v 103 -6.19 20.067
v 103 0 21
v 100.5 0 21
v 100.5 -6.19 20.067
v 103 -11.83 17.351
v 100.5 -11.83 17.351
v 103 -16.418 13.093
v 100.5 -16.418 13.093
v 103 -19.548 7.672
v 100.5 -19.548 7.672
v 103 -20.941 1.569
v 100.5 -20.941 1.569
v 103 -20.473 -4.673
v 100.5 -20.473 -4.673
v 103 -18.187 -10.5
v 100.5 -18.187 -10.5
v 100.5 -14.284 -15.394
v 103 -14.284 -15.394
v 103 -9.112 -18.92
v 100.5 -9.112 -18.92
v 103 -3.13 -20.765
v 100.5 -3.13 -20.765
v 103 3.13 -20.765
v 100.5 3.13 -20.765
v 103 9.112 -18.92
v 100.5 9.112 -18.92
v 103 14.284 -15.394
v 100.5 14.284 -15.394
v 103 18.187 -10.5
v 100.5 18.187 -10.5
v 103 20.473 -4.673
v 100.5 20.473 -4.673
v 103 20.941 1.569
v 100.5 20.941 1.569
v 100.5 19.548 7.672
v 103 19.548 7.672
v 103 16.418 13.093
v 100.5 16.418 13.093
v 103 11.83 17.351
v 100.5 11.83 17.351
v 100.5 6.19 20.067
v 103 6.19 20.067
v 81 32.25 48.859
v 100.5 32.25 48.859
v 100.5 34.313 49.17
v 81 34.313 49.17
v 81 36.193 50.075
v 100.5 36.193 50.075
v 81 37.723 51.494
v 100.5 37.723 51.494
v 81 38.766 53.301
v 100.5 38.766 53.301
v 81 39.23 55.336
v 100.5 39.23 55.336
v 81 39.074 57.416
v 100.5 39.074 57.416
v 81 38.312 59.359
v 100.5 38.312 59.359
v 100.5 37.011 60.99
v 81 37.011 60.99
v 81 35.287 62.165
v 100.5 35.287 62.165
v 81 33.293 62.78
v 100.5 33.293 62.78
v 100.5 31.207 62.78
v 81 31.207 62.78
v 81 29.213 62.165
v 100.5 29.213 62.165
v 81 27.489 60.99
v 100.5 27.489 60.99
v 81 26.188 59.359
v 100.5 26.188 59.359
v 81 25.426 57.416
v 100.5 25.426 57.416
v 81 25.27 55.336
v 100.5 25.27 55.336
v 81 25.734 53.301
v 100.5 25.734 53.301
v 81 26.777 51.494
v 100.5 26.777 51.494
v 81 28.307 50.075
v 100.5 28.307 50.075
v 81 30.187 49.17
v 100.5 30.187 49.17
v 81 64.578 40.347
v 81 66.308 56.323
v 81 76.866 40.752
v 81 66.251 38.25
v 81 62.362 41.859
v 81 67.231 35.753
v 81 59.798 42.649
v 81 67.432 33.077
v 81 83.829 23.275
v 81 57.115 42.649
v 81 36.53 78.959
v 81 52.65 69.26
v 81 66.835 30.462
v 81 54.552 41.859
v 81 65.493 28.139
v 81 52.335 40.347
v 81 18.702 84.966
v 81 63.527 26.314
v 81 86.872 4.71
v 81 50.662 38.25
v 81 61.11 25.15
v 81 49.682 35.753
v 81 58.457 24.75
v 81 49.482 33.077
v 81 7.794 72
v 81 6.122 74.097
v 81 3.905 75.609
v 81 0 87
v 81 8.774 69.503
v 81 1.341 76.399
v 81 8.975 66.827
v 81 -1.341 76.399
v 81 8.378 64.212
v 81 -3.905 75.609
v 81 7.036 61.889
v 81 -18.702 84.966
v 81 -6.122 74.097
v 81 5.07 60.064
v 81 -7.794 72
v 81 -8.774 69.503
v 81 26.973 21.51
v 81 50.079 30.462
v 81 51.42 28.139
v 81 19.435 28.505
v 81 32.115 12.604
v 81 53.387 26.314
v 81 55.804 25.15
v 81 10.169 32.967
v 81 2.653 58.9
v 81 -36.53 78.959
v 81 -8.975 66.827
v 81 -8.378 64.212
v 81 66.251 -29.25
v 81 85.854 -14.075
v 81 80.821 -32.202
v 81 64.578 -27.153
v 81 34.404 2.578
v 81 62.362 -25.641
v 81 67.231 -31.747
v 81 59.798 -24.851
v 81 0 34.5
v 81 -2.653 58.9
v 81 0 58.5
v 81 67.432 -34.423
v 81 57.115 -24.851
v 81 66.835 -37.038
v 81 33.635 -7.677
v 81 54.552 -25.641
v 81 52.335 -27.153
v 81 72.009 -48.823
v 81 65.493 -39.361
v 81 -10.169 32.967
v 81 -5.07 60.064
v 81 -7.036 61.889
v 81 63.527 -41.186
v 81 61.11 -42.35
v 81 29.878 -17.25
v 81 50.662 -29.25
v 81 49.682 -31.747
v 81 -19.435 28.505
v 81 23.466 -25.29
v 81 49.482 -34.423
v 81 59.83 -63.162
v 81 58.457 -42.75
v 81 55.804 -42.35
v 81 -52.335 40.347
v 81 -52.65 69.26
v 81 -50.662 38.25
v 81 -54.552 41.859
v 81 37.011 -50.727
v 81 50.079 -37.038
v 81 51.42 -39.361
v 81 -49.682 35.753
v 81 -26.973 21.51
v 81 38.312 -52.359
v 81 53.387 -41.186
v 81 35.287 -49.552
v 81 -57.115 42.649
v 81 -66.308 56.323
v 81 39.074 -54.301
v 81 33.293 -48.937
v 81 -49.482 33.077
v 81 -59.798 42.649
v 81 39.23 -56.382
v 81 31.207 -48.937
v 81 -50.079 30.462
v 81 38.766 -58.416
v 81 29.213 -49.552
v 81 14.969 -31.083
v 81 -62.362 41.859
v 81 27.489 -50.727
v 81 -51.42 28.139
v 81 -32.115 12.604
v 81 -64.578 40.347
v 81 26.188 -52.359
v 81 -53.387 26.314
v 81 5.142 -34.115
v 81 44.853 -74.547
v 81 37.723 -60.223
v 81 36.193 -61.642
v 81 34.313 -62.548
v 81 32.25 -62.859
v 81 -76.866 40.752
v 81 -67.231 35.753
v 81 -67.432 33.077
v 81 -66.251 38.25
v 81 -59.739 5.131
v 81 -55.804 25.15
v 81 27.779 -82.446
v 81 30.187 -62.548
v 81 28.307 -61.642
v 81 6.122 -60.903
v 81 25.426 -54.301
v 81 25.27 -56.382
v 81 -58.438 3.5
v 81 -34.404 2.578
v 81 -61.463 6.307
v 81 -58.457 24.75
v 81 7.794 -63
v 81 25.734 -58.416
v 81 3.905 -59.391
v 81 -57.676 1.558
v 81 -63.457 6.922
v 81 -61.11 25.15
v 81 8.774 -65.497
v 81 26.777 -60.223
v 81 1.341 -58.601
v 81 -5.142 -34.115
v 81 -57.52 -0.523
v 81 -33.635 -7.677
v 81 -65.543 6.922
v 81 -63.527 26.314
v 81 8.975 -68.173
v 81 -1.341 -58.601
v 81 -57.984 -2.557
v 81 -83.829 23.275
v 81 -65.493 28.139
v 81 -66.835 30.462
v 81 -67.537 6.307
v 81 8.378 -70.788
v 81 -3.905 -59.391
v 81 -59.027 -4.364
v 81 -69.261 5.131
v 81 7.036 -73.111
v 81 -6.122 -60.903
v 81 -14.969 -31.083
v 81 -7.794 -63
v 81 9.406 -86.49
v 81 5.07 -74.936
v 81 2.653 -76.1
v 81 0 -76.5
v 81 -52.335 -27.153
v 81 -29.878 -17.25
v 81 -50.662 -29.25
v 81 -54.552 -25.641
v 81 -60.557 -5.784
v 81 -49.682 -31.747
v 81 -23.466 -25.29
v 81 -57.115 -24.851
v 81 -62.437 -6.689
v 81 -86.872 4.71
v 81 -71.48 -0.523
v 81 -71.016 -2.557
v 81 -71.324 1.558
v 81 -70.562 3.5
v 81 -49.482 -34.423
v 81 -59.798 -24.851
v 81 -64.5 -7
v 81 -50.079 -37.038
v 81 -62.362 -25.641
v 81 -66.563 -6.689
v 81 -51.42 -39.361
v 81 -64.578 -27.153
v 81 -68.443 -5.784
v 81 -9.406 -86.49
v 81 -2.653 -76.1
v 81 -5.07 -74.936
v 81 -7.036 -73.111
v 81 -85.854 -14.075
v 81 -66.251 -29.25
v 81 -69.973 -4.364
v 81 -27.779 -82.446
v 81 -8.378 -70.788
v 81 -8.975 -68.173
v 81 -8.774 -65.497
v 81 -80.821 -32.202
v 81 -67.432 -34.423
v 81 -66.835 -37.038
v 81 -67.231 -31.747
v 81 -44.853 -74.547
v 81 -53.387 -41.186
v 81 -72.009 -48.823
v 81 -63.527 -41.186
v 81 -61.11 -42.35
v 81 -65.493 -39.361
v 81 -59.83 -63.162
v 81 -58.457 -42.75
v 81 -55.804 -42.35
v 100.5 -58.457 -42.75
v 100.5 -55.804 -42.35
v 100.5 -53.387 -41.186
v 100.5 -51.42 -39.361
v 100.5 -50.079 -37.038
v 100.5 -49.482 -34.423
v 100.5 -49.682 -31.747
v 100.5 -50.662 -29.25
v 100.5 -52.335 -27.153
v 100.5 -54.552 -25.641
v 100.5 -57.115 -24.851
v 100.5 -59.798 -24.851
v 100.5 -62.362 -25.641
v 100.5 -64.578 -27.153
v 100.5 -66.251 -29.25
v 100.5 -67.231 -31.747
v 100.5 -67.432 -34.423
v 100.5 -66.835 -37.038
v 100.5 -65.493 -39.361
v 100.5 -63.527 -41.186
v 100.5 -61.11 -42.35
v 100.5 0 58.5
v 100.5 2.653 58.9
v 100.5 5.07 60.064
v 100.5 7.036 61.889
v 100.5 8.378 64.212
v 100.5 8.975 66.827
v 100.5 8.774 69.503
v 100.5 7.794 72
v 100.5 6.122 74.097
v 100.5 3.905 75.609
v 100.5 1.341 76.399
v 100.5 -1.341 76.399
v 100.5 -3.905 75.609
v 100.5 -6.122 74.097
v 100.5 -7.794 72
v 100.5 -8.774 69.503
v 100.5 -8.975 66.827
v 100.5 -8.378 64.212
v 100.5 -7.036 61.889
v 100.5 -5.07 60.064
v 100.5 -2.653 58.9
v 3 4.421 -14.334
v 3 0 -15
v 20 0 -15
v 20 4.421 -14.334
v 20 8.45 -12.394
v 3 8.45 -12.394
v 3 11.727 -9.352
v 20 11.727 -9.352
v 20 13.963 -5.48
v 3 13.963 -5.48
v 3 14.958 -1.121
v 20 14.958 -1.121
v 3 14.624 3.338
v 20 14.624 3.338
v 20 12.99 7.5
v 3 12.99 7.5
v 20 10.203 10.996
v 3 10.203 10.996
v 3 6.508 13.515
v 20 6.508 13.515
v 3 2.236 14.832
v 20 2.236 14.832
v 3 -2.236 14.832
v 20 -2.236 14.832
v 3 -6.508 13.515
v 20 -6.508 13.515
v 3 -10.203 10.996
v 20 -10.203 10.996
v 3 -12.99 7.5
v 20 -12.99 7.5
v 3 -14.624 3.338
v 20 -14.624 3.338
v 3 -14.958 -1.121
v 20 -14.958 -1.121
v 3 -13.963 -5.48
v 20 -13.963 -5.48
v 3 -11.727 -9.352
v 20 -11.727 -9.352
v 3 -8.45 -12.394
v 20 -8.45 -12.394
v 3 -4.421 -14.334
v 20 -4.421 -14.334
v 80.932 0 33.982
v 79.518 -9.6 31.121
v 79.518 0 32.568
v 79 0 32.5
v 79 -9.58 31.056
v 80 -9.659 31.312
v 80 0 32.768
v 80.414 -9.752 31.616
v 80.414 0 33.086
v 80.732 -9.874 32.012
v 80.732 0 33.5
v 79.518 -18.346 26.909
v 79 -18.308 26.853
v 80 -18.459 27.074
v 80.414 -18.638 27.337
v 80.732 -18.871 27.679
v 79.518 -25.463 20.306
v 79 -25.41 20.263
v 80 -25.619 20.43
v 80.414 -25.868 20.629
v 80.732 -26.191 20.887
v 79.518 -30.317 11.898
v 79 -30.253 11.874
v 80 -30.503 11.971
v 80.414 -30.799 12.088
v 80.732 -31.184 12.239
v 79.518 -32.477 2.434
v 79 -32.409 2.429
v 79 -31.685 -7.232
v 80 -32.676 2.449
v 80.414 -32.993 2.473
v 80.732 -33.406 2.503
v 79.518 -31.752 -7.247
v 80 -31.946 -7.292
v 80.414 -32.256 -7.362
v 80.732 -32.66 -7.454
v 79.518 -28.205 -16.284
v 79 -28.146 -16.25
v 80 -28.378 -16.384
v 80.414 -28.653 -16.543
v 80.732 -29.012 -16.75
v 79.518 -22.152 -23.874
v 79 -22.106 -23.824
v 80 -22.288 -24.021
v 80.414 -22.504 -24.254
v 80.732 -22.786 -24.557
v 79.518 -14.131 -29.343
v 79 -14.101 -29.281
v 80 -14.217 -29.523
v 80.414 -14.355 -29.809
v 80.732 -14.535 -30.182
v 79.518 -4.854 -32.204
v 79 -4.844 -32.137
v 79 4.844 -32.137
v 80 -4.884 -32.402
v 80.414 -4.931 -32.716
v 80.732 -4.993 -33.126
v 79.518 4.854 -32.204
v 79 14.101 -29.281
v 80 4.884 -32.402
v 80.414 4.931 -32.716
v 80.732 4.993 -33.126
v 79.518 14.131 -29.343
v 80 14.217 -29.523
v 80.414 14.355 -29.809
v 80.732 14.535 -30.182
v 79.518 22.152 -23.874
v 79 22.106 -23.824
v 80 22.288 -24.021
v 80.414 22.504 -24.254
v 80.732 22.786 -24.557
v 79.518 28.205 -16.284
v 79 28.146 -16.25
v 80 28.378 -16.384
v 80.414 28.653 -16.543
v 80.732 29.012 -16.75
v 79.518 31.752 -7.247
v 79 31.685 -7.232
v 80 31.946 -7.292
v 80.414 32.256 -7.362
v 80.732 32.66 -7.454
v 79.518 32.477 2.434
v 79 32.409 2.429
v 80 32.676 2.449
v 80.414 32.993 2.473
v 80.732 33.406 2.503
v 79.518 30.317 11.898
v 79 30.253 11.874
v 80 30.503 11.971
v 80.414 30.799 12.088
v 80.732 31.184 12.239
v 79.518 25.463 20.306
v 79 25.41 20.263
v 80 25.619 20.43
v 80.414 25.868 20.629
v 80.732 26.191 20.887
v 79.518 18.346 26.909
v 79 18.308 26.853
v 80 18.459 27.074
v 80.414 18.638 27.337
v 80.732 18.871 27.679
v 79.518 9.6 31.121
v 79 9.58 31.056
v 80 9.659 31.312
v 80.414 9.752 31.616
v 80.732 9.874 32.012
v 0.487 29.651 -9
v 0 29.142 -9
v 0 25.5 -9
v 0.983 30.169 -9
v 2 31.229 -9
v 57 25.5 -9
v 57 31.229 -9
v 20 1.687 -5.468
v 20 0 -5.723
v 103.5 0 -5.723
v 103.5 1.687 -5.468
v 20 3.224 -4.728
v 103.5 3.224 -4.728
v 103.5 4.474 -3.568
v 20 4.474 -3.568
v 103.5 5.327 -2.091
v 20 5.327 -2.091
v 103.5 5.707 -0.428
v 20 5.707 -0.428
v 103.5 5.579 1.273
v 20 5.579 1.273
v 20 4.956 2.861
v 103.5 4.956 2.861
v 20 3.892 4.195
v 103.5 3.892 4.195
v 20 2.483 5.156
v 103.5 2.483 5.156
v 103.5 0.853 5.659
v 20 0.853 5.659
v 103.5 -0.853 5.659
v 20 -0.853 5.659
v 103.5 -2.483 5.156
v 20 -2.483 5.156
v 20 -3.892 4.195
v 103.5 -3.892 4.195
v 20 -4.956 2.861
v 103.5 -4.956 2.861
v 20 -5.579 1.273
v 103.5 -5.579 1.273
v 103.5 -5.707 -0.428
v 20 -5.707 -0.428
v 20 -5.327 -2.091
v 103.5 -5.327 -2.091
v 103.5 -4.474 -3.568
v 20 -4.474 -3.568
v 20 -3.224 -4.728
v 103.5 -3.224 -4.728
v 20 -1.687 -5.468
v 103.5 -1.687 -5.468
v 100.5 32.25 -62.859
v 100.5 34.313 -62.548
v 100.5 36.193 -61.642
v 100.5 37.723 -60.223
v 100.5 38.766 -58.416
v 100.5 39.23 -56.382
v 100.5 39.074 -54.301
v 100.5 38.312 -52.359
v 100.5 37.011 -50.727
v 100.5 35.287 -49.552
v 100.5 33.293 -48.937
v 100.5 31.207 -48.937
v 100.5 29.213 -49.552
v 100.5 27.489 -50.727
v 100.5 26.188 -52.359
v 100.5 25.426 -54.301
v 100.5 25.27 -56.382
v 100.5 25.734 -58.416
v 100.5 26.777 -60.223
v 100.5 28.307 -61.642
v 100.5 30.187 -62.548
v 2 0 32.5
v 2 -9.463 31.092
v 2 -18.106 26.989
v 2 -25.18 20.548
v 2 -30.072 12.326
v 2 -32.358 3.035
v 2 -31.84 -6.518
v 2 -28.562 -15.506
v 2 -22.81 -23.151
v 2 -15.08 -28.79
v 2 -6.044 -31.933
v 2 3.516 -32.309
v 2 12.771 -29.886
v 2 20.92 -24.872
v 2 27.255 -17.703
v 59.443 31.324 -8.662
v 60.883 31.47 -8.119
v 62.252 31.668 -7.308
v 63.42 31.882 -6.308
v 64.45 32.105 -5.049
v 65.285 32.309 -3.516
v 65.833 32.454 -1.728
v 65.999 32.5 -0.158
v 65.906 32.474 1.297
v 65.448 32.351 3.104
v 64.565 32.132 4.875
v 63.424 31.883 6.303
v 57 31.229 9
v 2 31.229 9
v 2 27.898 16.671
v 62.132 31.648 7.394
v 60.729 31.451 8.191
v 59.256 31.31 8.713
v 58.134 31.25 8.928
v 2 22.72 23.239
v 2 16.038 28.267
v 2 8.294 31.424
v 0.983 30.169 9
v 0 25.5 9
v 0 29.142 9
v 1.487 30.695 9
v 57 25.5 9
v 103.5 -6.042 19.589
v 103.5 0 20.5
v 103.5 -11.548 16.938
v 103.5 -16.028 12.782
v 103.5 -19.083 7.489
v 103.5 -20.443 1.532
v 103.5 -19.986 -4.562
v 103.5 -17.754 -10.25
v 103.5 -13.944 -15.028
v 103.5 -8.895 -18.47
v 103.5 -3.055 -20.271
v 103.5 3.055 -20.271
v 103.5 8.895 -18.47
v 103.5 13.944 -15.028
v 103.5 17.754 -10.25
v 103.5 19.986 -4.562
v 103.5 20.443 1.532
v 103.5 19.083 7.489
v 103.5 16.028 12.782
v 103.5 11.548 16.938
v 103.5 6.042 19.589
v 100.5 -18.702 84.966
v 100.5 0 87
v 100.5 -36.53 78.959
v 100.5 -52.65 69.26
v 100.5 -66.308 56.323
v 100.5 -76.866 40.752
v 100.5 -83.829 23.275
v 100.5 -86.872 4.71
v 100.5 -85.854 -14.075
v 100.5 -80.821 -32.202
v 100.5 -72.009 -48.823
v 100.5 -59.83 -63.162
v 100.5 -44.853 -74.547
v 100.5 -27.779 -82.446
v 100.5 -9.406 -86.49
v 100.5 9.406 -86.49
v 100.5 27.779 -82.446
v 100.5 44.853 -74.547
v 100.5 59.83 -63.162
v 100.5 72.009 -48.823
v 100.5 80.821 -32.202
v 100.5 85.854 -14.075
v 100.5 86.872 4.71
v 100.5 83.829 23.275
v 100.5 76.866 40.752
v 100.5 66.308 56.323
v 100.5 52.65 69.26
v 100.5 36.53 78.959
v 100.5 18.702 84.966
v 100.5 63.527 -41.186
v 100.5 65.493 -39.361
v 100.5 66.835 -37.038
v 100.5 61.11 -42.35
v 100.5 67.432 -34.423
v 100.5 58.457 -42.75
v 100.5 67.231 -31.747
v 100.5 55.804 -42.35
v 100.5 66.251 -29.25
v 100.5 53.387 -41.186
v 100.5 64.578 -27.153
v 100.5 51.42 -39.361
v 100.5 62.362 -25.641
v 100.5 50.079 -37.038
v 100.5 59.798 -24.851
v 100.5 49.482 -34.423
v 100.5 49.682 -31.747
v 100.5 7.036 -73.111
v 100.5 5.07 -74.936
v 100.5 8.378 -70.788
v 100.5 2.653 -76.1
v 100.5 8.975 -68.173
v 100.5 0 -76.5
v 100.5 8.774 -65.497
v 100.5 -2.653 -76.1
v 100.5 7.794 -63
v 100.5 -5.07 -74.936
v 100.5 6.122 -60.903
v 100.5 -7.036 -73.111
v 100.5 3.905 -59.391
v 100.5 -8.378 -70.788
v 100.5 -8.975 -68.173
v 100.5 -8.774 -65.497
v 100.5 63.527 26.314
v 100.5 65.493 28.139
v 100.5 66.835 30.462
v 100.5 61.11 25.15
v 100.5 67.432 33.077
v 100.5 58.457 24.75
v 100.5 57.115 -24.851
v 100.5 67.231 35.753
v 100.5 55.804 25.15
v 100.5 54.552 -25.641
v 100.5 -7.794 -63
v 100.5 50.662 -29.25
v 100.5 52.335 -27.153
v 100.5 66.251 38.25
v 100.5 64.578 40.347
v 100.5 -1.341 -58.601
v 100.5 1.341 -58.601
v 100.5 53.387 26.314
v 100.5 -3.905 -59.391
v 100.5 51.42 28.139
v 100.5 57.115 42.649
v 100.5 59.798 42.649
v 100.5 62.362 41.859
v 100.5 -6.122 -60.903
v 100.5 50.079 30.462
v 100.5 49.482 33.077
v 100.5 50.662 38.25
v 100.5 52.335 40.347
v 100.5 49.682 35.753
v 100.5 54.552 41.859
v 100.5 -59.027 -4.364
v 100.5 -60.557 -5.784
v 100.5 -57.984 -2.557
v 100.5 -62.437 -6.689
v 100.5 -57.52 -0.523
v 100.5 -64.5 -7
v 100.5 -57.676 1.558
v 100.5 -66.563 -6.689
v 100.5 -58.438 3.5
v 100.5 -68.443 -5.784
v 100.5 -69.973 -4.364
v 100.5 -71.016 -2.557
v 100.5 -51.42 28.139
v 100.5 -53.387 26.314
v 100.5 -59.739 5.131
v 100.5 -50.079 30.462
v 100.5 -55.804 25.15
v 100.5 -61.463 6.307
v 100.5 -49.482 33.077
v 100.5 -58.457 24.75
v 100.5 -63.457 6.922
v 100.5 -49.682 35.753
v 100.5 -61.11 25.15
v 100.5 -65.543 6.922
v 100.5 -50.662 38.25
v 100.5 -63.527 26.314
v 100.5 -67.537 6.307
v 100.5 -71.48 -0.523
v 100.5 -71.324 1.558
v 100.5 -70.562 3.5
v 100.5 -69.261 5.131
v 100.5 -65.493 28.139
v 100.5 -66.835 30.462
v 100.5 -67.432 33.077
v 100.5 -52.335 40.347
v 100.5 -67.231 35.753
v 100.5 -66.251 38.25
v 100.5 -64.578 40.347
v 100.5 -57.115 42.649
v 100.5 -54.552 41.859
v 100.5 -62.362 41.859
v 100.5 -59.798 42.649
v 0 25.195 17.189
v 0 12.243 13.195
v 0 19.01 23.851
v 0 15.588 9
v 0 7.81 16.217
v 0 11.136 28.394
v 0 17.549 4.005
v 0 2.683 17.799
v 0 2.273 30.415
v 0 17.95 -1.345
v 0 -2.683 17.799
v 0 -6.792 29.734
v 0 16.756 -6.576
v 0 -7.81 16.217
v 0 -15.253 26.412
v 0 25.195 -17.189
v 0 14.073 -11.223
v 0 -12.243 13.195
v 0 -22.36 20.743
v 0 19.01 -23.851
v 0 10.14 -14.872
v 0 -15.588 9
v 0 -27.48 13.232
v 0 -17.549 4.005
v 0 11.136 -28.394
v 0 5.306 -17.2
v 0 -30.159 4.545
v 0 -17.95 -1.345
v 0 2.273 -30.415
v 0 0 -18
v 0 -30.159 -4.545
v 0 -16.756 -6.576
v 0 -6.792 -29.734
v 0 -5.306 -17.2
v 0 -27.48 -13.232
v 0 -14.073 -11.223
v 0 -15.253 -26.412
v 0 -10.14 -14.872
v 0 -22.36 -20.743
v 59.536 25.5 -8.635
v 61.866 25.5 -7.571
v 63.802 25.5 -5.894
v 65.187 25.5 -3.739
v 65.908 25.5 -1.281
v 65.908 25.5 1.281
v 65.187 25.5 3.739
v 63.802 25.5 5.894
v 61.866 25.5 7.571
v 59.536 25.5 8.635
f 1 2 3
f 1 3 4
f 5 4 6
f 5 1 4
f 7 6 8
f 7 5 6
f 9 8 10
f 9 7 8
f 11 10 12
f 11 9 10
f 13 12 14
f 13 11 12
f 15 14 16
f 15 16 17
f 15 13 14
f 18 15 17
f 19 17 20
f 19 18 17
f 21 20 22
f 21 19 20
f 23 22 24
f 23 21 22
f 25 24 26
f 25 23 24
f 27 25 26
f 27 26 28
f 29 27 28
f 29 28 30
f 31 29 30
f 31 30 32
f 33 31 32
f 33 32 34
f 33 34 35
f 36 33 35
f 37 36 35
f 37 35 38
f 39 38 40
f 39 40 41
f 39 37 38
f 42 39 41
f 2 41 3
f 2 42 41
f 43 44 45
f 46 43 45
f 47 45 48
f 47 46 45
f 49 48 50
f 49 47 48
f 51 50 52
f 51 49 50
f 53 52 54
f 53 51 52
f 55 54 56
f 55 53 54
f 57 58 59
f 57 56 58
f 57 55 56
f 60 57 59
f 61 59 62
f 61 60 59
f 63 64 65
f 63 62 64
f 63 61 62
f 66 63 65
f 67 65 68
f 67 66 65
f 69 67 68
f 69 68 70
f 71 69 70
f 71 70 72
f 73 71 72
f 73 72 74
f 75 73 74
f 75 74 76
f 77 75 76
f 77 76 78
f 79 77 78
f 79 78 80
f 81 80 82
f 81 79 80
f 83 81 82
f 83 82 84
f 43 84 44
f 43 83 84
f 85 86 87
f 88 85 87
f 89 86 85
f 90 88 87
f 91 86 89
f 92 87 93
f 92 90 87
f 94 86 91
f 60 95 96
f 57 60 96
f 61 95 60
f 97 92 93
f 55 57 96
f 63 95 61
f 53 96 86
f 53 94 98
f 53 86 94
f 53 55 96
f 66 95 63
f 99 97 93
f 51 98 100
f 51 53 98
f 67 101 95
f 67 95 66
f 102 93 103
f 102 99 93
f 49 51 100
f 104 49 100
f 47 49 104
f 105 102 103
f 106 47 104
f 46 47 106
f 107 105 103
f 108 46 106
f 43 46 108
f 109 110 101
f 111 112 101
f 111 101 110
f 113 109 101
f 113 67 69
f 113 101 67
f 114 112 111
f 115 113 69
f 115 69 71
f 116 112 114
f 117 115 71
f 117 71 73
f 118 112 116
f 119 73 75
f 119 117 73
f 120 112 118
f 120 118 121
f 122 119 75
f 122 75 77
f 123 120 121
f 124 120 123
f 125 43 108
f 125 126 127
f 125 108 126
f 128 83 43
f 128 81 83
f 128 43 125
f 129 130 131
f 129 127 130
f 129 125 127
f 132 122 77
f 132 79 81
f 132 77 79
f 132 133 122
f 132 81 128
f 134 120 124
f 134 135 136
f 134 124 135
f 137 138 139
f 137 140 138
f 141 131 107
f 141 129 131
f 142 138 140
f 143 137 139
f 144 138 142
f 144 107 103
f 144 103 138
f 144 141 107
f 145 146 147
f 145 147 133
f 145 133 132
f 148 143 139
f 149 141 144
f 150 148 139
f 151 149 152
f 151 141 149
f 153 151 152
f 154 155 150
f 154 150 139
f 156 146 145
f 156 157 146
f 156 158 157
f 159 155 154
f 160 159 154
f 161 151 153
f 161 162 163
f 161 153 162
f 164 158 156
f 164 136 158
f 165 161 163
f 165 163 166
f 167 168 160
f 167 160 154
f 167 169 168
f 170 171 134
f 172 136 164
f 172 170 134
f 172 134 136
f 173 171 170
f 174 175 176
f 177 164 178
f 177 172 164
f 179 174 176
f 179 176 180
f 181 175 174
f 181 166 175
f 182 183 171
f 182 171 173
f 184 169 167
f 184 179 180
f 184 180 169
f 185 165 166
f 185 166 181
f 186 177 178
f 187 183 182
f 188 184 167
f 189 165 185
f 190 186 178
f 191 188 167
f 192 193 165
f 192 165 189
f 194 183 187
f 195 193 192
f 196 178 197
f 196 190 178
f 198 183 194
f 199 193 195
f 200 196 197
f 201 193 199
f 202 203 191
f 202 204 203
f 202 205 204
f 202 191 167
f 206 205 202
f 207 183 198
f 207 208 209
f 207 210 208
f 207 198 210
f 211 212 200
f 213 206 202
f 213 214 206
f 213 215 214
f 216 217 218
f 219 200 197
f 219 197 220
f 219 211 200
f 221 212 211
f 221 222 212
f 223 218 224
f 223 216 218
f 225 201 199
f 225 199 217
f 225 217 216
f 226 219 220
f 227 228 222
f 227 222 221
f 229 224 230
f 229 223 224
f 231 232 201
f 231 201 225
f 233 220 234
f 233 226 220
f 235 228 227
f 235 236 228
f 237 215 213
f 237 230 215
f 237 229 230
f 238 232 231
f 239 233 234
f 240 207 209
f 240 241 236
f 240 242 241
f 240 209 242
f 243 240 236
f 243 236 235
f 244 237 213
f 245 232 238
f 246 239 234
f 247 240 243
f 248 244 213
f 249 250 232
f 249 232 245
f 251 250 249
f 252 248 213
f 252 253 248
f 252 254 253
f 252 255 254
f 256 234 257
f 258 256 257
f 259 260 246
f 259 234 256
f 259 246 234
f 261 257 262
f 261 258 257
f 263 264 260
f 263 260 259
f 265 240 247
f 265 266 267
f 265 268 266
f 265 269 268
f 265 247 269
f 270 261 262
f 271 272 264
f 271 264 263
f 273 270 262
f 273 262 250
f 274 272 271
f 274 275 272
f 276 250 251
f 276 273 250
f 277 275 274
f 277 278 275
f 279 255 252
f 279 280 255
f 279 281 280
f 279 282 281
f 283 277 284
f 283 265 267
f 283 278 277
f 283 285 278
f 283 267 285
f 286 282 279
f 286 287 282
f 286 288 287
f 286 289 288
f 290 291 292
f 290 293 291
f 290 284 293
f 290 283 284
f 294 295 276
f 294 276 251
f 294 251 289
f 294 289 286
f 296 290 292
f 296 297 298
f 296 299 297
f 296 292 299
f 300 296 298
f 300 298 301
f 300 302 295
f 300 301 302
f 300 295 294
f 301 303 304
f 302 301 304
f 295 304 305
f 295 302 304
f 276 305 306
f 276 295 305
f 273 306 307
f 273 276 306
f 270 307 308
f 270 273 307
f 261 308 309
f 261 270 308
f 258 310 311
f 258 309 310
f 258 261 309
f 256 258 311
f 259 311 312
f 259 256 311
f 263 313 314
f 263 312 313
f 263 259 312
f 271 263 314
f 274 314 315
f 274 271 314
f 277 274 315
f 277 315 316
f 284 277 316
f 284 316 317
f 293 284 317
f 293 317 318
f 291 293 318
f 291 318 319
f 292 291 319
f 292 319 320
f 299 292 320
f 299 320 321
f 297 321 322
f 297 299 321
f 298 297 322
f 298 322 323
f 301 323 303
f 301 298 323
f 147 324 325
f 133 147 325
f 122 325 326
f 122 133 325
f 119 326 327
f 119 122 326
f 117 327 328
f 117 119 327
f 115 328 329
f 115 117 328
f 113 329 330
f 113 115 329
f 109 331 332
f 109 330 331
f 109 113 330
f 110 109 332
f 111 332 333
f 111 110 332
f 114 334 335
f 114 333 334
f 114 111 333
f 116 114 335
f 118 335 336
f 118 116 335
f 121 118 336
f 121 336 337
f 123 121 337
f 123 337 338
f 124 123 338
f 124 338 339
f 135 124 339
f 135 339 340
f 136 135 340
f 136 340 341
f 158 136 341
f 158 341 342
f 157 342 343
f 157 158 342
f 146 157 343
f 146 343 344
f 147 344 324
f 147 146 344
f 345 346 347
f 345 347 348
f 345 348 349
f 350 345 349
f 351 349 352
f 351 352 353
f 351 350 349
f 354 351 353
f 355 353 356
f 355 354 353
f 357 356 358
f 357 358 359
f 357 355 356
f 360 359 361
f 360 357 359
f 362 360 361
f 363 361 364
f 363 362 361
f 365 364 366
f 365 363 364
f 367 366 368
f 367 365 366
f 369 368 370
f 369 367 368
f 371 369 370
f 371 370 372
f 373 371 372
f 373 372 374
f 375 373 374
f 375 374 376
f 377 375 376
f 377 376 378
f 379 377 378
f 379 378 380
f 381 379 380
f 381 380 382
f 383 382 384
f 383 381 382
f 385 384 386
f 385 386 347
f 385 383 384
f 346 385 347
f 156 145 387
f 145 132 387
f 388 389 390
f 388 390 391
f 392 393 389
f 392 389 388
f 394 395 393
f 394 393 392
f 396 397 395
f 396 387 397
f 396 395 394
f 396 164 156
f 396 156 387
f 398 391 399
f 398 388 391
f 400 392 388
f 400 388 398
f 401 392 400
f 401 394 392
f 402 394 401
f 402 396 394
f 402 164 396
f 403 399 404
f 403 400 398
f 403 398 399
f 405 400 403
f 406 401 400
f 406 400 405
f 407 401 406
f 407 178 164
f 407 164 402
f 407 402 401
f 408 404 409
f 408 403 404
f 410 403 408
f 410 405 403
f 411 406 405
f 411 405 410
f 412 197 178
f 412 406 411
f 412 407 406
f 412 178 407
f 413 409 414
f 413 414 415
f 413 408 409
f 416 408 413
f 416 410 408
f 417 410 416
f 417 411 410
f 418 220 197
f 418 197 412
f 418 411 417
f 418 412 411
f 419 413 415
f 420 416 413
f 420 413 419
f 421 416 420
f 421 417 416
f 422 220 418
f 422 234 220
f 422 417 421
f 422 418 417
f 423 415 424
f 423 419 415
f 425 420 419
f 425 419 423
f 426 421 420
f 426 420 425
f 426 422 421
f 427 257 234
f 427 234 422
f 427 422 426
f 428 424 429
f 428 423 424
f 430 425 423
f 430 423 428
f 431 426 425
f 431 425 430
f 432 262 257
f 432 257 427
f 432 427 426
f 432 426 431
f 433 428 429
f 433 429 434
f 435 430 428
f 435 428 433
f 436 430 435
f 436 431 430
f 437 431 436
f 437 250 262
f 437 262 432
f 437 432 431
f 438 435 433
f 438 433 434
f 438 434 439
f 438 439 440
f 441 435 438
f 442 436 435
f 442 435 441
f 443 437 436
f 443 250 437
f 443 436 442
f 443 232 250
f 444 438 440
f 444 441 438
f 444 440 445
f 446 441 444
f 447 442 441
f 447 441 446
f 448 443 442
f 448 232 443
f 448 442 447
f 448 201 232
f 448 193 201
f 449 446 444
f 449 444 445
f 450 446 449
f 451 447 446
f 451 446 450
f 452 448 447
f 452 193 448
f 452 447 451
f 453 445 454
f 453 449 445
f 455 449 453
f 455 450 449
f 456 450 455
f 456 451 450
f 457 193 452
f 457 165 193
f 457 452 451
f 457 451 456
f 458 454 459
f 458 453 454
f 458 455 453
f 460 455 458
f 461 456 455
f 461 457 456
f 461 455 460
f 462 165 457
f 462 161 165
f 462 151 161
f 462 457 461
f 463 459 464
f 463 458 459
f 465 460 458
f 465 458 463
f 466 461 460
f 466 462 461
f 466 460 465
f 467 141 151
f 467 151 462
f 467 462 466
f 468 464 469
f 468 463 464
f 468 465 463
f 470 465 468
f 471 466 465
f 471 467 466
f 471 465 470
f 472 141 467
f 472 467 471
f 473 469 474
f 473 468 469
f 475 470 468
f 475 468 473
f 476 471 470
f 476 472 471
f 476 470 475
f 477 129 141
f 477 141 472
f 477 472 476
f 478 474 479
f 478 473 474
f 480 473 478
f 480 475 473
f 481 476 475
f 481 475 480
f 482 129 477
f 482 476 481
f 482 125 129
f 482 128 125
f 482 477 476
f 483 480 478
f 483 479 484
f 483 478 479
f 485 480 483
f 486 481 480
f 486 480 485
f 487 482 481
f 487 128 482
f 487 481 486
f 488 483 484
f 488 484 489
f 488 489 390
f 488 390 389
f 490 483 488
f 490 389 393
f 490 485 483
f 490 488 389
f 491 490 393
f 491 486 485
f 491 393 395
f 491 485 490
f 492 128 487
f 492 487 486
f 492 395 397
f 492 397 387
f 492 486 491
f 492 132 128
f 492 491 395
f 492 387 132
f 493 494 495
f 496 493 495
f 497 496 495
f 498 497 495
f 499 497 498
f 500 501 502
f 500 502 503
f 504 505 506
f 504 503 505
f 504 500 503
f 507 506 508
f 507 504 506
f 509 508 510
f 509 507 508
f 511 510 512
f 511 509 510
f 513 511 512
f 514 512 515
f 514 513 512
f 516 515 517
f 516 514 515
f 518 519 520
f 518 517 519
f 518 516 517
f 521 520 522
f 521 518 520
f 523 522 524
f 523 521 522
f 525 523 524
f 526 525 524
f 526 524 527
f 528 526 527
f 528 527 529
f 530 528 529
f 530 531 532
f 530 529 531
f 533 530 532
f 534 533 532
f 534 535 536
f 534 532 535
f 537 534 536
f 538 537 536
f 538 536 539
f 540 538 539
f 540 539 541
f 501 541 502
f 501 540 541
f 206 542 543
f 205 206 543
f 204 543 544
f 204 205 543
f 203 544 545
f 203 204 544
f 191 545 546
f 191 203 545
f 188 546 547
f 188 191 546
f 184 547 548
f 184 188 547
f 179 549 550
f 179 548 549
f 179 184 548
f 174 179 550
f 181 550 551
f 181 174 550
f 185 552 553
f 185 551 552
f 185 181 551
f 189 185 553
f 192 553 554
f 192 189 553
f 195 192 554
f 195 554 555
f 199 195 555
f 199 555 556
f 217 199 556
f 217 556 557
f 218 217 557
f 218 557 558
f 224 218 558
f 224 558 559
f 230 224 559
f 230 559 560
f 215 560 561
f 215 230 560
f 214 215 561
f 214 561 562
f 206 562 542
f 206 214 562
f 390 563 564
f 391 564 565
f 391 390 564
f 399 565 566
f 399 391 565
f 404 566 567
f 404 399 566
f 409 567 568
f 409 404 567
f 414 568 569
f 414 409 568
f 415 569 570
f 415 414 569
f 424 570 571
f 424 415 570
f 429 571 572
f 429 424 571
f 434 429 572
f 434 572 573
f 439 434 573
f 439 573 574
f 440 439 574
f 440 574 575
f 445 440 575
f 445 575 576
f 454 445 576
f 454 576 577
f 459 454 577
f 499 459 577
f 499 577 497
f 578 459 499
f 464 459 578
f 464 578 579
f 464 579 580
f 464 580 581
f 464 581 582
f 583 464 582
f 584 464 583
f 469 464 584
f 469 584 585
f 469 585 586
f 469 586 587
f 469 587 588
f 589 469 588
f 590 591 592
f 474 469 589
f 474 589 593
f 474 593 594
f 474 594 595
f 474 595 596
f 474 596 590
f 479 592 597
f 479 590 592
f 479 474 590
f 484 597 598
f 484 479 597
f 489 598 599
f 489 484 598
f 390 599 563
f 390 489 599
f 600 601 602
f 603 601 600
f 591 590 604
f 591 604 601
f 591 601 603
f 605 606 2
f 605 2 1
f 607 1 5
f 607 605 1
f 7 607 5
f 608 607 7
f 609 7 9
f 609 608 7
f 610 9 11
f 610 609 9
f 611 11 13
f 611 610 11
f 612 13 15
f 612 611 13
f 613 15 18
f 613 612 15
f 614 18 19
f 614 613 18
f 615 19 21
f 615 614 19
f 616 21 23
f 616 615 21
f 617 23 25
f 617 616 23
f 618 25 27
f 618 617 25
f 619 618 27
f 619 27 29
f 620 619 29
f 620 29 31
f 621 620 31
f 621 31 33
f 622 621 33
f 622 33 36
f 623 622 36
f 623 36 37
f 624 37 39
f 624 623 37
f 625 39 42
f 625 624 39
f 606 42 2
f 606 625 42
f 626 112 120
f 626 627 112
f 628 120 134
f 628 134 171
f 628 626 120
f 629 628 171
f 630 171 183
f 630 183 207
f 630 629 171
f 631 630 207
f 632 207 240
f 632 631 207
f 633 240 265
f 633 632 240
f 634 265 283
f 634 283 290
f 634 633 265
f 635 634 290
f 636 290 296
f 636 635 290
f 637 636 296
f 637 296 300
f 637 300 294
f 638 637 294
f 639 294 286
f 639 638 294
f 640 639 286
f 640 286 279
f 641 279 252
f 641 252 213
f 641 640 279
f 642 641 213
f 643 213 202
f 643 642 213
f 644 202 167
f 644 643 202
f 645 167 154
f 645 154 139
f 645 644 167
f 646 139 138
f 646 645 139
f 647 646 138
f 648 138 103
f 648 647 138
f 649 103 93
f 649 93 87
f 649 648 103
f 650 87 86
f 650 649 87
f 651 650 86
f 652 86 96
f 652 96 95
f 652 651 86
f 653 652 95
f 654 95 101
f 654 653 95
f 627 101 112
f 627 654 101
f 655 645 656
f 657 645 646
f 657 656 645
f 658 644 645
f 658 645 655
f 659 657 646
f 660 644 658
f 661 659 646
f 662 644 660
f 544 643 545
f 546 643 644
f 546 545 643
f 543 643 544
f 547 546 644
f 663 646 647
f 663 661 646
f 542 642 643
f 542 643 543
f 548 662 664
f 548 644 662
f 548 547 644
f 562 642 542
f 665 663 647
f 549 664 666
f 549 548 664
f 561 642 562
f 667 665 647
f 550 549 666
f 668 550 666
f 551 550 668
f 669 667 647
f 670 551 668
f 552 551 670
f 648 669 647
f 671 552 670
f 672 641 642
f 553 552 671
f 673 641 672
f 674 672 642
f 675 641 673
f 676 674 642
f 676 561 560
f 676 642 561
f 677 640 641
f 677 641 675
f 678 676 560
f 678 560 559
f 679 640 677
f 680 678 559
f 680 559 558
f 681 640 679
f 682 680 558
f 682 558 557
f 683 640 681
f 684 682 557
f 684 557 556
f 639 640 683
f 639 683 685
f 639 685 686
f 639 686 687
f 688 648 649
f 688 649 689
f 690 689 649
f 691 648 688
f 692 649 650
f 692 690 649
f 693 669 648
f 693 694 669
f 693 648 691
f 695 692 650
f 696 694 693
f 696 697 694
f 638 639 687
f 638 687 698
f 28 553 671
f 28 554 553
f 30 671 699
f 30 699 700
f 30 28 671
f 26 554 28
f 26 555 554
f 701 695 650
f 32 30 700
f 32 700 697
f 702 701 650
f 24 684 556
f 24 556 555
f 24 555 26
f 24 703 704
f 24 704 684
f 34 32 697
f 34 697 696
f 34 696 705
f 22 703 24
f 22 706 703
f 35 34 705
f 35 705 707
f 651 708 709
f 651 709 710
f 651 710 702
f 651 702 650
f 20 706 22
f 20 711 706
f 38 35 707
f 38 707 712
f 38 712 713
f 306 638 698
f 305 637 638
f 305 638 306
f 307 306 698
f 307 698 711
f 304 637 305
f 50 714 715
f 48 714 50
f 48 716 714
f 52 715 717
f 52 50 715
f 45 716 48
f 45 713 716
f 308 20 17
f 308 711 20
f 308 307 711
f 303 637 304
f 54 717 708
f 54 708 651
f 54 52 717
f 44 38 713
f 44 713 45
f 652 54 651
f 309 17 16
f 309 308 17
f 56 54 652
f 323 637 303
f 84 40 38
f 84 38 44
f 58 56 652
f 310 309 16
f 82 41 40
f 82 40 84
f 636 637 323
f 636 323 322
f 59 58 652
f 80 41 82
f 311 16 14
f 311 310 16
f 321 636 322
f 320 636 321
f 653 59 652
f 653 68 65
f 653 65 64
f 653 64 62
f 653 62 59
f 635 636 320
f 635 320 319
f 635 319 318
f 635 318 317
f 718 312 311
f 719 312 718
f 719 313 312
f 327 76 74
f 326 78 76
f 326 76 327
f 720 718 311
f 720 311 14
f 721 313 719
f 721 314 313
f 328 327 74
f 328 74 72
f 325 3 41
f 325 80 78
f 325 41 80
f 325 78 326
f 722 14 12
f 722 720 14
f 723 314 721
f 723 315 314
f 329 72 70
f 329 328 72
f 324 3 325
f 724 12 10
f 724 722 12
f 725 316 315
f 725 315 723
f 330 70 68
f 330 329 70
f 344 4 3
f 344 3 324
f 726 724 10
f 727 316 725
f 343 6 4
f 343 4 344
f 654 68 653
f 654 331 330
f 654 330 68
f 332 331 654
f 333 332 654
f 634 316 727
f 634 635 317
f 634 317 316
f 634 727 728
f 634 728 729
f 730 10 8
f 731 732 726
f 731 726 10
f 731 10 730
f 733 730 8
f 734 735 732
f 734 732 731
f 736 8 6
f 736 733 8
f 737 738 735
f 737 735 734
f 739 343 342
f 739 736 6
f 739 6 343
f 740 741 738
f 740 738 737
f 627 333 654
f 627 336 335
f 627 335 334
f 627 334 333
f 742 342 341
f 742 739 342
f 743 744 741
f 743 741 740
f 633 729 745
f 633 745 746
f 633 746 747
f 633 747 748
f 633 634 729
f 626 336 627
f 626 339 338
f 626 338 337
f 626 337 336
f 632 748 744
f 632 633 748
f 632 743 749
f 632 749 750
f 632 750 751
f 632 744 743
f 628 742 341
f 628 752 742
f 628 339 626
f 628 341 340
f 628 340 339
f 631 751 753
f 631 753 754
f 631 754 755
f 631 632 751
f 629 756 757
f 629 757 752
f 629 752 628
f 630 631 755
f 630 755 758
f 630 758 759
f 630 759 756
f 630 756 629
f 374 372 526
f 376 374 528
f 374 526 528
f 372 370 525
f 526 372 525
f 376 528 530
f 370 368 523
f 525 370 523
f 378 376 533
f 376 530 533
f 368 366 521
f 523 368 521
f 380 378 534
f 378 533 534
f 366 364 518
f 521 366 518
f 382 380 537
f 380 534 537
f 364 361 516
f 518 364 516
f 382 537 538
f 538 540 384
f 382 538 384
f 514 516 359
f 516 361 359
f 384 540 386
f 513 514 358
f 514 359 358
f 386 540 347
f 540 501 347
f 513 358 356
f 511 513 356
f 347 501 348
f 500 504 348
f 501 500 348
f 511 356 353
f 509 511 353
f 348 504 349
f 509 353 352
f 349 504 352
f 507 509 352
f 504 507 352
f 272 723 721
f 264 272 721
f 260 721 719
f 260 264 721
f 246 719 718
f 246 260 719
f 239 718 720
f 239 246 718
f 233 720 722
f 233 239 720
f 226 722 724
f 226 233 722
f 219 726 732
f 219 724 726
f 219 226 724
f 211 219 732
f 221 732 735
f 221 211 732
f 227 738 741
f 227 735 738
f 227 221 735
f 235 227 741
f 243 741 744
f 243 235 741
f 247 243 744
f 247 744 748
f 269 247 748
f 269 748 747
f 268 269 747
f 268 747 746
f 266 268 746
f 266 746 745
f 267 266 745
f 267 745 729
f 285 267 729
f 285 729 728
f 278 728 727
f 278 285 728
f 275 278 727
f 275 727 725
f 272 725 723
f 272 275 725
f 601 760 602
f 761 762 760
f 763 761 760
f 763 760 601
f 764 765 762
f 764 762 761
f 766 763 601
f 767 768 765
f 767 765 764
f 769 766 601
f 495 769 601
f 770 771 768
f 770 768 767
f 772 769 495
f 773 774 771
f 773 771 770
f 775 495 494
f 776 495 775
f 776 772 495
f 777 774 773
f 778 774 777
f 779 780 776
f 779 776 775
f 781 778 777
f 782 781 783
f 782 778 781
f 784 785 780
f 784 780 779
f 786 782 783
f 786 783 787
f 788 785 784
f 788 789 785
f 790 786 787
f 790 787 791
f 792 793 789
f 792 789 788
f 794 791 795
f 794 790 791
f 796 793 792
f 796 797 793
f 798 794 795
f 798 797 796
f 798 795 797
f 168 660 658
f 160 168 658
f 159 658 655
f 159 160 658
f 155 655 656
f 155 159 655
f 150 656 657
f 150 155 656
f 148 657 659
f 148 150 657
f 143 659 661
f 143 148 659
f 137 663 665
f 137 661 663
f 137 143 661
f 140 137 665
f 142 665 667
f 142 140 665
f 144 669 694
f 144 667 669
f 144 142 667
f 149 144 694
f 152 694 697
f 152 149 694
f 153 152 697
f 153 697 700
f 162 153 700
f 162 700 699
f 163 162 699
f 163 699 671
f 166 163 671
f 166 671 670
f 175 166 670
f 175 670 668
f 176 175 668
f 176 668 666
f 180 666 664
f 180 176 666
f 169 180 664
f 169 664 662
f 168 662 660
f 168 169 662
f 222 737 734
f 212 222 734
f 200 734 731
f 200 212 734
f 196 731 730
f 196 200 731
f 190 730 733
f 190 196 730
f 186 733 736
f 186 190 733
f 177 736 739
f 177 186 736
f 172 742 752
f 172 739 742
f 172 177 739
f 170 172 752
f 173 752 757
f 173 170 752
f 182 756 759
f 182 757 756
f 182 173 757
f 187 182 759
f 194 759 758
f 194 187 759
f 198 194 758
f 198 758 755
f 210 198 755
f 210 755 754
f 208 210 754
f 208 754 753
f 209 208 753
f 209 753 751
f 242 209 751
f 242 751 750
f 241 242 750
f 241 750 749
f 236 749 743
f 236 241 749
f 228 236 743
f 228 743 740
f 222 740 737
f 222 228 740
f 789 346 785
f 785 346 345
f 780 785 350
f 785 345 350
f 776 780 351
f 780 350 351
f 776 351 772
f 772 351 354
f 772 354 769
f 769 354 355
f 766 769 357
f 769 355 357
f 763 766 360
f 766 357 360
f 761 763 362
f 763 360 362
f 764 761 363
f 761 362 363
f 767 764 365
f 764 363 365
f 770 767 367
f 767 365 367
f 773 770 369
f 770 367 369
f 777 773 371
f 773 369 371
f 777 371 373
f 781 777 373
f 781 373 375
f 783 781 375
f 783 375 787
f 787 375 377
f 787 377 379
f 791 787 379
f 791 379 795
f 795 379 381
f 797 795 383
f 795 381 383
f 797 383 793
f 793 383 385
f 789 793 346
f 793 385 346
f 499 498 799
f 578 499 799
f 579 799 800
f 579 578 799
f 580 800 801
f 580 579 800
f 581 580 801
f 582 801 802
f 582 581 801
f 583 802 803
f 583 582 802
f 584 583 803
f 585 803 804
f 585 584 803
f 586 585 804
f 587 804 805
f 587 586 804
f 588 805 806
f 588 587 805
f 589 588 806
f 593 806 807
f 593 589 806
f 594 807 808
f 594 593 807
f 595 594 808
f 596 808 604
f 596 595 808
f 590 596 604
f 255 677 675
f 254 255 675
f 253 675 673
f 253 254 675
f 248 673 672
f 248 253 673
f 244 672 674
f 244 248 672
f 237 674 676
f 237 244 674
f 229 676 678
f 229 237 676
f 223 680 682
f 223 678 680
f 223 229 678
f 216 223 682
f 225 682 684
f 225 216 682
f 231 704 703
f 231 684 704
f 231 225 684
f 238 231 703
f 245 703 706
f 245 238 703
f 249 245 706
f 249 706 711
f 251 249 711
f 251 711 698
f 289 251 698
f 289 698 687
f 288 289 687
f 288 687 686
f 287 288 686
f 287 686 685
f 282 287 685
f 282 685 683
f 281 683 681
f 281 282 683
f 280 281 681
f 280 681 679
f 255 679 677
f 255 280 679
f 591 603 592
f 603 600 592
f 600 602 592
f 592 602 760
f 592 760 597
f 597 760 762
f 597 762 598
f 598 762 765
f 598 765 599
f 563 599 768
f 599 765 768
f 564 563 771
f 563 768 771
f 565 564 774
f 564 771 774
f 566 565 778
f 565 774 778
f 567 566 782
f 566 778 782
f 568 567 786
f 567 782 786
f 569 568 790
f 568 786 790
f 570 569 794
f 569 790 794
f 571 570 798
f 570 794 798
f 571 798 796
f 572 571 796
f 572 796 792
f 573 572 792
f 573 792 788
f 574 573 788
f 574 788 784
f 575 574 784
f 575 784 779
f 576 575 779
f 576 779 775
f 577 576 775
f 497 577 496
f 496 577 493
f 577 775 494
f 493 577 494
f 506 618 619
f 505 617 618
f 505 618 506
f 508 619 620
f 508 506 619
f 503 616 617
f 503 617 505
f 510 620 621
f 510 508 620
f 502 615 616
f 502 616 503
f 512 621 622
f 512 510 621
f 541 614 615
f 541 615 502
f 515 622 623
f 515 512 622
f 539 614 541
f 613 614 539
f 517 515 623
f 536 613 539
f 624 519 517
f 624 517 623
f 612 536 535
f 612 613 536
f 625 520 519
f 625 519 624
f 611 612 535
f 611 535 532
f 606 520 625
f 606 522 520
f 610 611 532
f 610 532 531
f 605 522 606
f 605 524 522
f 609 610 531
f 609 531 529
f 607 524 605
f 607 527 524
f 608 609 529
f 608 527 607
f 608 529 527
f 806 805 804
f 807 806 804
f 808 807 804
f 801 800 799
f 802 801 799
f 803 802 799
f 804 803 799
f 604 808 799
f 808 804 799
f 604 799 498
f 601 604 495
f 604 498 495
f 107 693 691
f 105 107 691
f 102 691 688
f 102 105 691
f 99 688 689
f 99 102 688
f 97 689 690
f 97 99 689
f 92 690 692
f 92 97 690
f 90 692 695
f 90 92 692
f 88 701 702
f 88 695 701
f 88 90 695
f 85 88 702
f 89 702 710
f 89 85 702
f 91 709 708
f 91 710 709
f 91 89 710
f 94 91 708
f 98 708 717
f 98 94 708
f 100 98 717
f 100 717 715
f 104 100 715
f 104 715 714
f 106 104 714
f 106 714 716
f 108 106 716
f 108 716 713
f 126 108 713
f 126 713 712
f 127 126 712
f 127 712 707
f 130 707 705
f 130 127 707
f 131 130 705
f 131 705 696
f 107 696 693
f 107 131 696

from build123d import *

# Parameters (mm, degrees)
FILLET_1_R               = 2
CHAMFER_1_SIZE           = 2
CHAMFER_2_SIZE           = 0.5
SKETCH_4_R               = 15
CUT_EXTRUDE_3_DEPTH      = 20
CHAMFER_3_SIZE           = 3
CUT_EXTRUDE_4_DEPTH      = 161.780129369
CUT_EXTRUDE_4_DEPTH_BACK = 161.780129369
SKETCH_5_R               = 5.7226
CUT_EXTRUDE_5_DEPTH      = 14.5
CUT_EXTRUDE_6_DEPTH      = 161.780129369
CUT_EXTRUDE_6_DEPTH_BACK = 161.780129369
SKETCH_7_R               = 9
SKETCH_7_R_2             = 7


with BuildPart() as part:
    # ｽｹｯﾁ1 → 回転1 (revolve)
    with BuildSketch(Plane.XY, mode=Mode.PRIVATE) as revolve_1_sk:
        Polygon((0, 0), (0, 32.5), (81, 32.5), (81, 87), (100.5, 87), (100.5, 21), (103.5, 21), (103.5, 0), align=None)
    revolve(revolve_1_sk.sketch.rotate(Axis((0, 0, 0), (1, 0, 0)), 90), axis=Axis((0, 0, 0), (1, 0, 0)))

    # ﾌｨﾚｯﾄ1
    fillet_1_edges = [part.edges().sort_by_distance(p)[0] for p in [
        (81, 0, -32.5),
    ]]
    fillet(fillet_1_edges, radius=FILLET_1_R)

    # 面取り1
    chamfer_1_edges = [part.edges().sort_by_distance(p)[0] for p in [
        (0, 0, -32.5),
    ]]
    chamfer(chamfer_1_edges, length=CHAMFER_1_SIZE)

    # 面取り2
    chamfer_2_edges = [part.edges().sort_by_distance(p)[0] for p in [
        (103.5, 0, -21),
    ]]
    chamfer(chamfer_2_edges, length=CHAMFER_2_SIZE)

    # ｽｹｯﾁ4 → ｶｯﾄ - 押し出し3 (cut)
    with BuildSketch(Plane(origin=(0, 0, 0), x_dir=(0, 0, -1), z_dir=(1, 0, 0))):
        Circle(SKETCH_4_R)
    extrude(amount=CUT_EXTRUDE_3_DEPTH, mode=Mode.SUBTRACT)

    # 面取り3
    chamfer_3_edges = [part.edges().sort_by_distance(p)[0] for p in [
        (0, 0, 15),
    ]]
    chamfer(chamfer_3_edges, length=CHAMFER_3_SIZE)

    # ｽｹｯﾁ5 → ｶｯﾄ - 押し出し4 (cut, two sides: drawn at the far end of the back side and taken through both)
    with BuildSketch(Plane(origin=(0, 0, 0), x_dir=(0, 0, -1), z_dir=(1, 0, 0)).offset(-CUT_EXTRUDE_4_DEPTH_BACK)):
        Circle(SKETCH_5_R)
    extrude(amount=CUT_EXTRUDE_4_DEPTH + CUT_EXTRUDE_4_DEPTH_BACK, mode=Mode.SUBTRACT)

    # ｽｹｯﾁ6 → ｶｯﾄ - 押し出し5 (cut)
    with BuildSketch(Plane(origin=(0, 40, 0), x_dir=(1, 0, 0), z_dir=(0, 1, 0))):
        with BuildLine():
            Line((-5, 9), (57, 9))
            ThreePointArc((57, 9), (66, 0), (57, -9))
            Line((57, -9), (-5, -9))
            ThreePointArc((-5, -9), (-14, 0), (-5, 9))
        make_face()
    extrude(amount=-CUT_EXTRUDE_5_DEPTH, mode=Mode.SUBTRACT)

    # ｽｹｯﾁ7 → ｶｯﾄ - 押し出し6 (cut, two sides: drawn at the far end of the back side and taken through both)
    with BuildSketch(Plane(origin=(0, 0, 0), x_dir=(0, 0, -1), z_dir=(1, 0, 0)).offset(-CUT_EXTRUDE_6_DEPTH_BACK)):
        with Locations((67.5, 0)):
            Circle(SKETCH_7_R)
        with Locations((33.75, 58.456714755)):
            Circle(SKETCH_7_R)
        with Locations((-33.75, 58.456714755)):
            Circle(SKETCH_7_R)
        with Locations((-67.5, 0)):
            Circle(SKETCH_7_R)
        with Locations((-33.75, -58.456714755)):
            Circle(SKETCH_7_R)
        with Locations((33.75, -58.456714755)):
            Circle(SKETCH_7_R)
        with Locations((55.858638544, 32.25)):
            Circle(SKETCH_7_R_2)
        with Locations((-55.858638544, 32.25)):
            Circle(SKETCH_7_R_2)
        with Locations((0, -64.5)):
            Circle(SKETCH_7_R_2)
    extrude(amount=CUT_EXTRUDE_6_DEPTH + CUT_EXTRUDE_6_DEPTH_BACK, mode=Mode.SUBTRACT)


solid = part.part
